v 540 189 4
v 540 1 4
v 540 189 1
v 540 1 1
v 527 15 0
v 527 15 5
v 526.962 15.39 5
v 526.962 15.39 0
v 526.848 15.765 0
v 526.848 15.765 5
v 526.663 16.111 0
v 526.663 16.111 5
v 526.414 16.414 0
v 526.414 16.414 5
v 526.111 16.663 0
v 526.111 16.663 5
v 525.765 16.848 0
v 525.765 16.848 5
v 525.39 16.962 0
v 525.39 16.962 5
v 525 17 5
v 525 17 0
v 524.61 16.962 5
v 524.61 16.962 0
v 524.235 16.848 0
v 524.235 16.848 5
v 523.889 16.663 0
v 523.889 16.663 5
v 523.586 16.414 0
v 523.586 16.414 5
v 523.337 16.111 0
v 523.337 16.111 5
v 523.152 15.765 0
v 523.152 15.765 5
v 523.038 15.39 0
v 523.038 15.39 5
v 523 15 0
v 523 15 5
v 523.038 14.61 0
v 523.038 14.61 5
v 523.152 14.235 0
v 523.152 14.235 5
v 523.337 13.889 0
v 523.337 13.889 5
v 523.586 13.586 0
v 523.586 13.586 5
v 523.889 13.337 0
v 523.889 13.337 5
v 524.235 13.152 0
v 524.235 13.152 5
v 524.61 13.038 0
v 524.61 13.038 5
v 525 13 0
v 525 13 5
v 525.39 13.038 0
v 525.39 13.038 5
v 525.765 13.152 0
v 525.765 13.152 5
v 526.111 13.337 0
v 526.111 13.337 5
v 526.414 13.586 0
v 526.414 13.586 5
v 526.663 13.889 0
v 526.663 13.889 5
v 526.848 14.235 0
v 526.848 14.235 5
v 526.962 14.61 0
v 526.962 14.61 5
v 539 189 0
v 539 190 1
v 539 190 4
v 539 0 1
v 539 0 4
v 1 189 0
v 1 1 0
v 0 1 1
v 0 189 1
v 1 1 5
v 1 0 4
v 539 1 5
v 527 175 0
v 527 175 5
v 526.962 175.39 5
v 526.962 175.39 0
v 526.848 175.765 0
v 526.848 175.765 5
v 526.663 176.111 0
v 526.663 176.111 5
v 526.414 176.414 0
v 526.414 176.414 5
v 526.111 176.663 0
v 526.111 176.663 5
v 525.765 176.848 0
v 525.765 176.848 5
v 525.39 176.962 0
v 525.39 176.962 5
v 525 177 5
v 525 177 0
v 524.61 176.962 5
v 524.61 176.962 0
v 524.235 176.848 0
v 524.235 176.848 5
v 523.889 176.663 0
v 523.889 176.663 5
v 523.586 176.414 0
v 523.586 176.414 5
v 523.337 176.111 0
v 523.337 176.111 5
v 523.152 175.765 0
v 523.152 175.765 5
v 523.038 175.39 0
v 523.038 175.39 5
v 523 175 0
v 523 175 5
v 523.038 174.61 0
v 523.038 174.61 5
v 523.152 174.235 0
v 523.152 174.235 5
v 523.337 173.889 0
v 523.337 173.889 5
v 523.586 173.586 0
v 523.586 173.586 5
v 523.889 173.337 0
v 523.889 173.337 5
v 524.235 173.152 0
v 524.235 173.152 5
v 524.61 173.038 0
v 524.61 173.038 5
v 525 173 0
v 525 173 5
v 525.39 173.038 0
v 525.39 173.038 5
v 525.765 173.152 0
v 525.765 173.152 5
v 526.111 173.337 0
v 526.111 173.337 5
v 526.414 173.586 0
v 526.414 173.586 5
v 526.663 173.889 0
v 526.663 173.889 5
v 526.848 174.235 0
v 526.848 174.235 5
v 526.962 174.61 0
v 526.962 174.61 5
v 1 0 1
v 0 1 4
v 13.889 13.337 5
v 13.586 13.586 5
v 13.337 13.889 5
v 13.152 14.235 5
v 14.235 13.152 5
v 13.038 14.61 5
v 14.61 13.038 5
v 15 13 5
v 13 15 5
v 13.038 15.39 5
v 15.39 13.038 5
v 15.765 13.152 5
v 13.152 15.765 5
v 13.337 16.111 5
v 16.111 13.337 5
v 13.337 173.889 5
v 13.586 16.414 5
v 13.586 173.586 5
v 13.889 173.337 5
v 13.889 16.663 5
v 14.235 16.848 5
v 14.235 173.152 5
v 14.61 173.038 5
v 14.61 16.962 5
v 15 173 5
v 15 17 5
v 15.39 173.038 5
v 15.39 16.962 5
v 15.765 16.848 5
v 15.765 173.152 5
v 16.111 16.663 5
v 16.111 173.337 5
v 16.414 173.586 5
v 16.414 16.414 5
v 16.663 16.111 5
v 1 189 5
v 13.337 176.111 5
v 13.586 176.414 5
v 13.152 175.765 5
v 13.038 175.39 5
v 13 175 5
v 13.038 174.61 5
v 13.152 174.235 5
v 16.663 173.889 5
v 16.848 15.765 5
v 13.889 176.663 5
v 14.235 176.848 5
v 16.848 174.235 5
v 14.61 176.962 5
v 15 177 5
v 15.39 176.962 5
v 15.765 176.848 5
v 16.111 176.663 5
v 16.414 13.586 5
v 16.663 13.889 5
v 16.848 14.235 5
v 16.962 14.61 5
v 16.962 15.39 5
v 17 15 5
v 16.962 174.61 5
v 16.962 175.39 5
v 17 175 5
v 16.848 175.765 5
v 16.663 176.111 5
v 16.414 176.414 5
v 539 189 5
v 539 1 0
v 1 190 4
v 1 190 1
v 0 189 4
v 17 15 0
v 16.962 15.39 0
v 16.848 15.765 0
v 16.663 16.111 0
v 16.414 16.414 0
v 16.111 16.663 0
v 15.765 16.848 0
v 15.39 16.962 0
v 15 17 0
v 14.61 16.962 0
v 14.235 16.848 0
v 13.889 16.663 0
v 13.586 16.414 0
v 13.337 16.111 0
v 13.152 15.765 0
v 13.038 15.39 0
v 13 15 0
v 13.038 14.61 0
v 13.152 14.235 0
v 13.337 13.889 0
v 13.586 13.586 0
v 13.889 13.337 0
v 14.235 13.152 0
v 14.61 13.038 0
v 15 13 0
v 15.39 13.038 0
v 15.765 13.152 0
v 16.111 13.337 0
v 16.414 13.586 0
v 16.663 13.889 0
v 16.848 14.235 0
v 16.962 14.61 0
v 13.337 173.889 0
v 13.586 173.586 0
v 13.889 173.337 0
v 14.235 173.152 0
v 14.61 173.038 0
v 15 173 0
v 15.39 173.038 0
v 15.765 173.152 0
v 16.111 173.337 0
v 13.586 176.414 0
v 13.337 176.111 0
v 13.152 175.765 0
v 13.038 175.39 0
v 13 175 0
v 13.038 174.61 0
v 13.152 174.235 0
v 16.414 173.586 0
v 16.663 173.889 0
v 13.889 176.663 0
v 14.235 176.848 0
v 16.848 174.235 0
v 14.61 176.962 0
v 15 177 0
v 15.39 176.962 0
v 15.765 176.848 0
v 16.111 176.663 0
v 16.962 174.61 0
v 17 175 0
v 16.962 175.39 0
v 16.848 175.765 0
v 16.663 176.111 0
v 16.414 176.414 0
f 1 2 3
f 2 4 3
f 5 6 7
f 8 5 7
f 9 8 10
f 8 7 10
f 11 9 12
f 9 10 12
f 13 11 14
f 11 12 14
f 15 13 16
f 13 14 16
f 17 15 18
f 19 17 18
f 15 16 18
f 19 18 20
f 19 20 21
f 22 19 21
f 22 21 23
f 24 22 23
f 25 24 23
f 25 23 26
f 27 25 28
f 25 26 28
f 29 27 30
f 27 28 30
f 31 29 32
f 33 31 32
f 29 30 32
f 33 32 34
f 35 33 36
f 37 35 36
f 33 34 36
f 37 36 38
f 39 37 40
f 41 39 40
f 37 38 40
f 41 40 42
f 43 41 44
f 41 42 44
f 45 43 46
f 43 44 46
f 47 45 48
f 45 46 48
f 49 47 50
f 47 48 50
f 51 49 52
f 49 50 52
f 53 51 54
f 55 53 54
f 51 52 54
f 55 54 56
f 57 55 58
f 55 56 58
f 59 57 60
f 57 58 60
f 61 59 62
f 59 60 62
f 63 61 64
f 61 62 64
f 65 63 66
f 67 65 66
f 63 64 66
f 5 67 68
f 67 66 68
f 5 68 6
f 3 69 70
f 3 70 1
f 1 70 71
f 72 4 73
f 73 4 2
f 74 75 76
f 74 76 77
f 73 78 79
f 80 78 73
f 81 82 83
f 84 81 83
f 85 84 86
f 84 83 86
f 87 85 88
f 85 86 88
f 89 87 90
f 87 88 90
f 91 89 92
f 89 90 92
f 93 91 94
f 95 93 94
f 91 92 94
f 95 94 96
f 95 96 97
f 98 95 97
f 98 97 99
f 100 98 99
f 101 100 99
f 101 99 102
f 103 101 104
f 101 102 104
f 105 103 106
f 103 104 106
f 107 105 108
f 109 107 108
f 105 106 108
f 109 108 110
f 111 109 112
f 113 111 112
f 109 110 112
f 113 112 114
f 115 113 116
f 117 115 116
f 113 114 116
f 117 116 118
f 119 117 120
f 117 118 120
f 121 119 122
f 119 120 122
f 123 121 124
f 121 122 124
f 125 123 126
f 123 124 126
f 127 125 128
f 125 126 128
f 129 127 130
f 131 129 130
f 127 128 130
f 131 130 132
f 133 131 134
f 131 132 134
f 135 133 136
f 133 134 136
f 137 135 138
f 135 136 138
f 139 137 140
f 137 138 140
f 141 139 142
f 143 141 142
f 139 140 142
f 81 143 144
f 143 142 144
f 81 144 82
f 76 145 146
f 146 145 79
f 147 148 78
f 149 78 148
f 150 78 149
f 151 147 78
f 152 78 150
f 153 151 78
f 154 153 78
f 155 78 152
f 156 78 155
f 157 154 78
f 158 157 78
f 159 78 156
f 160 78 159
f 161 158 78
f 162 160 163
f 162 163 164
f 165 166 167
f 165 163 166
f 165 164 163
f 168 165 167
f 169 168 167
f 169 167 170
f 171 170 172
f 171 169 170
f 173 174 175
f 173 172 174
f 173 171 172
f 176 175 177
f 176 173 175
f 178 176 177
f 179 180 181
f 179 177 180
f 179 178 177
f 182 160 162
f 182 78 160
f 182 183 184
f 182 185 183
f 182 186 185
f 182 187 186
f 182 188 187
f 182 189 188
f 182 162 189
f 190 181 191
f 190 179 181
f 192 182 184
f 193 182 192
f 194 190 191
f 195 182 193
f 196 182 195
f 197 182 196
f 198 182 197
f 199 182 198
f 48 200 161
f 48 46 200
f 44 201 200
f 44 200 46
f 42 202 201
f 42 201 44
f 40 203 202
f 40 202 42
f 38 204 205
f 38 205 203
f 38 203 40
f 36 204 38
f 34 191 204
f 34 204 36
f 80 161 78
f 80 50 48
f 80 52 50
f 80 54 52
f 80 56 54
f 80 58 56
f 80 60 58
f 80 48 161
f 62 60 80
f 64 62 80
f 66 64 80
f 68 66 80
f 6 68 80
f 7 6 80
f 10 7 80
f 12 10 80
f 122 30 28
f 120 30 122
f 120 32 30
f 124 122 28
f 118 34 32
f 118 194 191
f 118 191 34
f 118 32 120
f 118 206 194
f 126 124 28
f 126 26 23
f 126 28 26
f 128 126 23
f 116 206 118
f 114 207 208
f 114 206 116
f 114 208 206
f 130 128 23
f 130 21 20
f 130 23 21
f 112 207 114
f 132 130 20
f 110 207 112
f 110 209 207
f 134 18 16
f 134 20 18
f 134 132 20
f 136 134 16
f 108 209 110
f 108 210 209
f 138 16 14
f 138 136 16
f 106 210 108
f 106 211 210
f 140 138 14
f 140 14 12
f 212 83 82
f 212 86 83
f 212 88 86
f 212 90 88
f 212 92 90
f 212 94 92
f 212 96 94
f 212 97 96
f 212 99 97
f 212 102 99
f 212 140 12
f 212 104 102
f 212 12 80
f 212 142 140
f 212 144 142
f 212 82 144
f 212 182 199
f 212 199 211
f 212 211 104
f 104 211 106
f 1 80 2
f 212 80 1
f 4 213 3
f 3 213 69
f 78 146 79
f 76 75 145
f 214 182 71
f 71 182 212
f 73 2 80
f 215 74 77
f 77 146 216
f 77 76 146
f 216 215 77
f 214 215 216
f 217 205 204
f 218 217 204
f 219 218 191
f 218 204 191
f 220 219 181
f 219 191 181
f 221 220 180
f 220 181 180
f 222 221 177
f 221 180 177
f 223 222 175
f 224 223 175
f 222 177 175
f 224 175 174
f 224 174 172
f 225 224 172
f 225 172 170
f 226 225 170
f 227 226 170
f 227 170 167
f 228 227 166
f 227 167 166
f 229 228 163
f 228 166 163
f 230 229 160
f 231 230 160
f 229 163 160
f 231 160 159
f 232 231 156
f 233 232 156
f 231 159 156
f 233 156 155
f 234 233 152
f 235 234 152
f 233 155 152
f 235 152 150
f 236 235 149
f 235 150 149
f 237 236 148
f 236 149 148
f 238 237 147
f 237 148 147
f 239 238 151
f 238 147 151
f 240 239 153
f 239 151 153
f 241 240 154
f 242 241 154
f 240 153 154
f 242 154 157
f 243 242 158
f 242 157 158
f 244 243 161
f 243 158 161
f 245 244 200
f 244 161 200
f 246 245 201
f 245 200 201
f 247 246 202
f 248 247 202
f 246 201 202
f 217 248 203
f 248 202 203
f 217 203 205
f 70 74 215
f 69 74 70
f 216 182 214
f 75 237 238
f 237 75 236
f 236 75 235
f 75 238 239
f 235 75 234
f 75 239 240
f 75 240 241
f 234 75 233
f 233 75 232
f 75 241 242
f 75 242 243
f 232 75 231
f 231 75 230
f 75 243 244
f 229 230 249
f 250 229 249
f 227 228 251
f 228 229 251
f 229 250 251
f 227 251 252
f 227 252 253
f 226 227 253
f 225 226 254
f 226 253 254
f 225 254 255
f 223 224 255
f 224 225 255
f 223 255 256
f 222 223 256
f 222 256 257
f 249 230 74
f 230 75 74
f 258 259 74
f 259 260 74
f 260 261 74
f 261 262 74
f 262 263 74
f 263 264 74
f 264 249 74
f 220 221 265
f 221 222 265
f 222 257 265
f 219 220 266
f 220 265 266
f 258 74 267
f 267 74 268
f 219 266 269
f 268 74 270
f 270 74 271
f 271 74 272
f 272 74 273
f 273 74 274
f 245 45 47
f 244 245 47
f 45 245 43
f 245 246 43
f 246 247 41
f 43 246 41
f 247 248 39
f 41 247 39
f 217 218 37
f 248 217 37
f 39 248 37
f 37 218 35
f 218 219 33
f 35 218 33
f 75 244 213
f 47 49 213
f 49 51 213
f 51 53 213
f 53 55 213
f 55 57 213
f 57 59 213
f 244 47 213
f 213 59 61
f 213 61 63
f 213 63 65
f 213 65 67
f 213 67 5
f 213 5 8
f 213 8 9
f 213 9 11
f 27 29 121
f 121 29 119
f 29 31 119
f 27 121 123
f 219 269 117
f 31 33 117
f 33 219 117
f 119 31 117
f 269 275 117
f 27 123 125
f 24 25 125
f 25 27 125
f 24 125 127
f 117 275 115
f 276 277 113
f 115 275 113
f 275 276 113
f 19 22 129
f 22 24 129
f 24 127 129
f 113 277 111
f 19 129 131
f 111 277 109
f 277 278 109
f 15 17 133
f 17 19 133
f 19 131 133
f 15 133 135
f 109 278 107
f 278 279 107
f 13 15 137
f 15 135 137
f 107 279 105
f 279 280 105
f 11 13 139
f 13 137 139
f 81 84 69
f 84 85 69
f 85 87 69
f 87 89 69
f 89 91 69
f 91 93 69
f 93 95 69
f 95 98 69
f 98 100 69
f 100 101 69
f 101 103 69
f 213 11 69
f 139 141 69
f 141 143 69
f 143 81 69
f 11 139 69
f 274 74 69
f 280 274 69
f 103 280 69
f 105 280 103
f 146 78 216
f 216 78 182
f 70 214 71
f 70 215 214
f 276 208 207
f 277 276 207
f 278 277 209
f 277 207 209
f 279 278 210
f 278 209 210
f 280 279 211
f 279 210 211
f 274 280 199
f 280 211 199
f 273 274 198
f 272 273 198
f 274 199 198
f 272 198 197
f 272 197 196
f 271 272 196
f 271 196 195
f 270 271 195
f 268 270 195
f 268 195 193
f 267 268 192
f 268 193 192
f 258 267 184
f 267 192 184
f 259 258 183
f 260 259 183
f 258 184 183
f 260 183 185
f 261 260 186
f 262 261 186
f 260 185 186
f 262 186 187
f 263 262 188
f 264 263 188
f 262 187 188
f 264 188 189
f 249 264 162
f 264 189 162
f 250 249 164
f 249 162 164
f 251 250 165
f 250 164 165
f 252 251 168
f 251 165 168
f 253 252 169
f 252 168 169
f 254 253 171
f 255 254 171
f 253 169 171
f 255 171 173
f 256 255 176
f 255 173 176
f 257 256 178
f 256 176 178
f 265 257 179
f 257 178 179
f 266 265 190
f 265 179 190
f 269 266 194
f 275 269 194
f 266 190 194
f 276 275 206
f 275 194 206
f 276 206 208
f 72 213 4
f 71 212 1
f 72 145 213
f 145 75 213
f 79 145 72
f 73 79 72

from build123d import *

# Parameters (mm, degrees)
SKETCH1_W           = 540
SKETCH1_H           = 190
BOSS_EXTRUDE1_DEPTH = 5
CHAMFER1_SIZE       = 1
SKETCH2_R           = 2
CUT_EXTRUDE1_DEPTH  = 5


with BuildPart() as part:
    # Sketch1 → Boss-Extrude1 (new body)
    with BuildSketch(Plane.XY):
        with Locations((270, 95)):
            Rectangle(SKETCH1_W, SKETCH1_H)
    extrude(amount=BOSS_EXTRUDE1_DEPTH)

    # Chamfer1
    chamfer1_edges = [part.edges().sort_by_distance(p)[0] for p in [
        (540, 95, 5),
        (270, 190, 5),
        (0, 95, 5),
        (270, 190, 0),
        (540, 95, 0),
        (270, 0, 0),
        (0, 95, 0),
        (0, 190, 2.5),
        (540, 190, 2.5),
        (540, 0, 2.5),
        (0, 0, 2.5),
        (270, 0, 5),
    ]]
    chamfer(chamfer1_edges, length=CHAMFER1_SIZE)

    # Sketch2 → Cut-Extrude1 (cut)
    with BuildSketch(Plane.XY.offset(5)):
        with Locations((525, 175)):
            Circle(SKETCH2_R)
        with Locations((525, 15)):
            Circle(SKETCH2_R)
        with Locations((15, 175)):
            Circle(SKETCH2_R)
        with Locations((15, 15)):
            Circle(SKETCH2_R)
    extrude(amount=-CUT_EXTRUDE1_DEPTH, mode=Mode.SUBTRACT)


solid = part.part
